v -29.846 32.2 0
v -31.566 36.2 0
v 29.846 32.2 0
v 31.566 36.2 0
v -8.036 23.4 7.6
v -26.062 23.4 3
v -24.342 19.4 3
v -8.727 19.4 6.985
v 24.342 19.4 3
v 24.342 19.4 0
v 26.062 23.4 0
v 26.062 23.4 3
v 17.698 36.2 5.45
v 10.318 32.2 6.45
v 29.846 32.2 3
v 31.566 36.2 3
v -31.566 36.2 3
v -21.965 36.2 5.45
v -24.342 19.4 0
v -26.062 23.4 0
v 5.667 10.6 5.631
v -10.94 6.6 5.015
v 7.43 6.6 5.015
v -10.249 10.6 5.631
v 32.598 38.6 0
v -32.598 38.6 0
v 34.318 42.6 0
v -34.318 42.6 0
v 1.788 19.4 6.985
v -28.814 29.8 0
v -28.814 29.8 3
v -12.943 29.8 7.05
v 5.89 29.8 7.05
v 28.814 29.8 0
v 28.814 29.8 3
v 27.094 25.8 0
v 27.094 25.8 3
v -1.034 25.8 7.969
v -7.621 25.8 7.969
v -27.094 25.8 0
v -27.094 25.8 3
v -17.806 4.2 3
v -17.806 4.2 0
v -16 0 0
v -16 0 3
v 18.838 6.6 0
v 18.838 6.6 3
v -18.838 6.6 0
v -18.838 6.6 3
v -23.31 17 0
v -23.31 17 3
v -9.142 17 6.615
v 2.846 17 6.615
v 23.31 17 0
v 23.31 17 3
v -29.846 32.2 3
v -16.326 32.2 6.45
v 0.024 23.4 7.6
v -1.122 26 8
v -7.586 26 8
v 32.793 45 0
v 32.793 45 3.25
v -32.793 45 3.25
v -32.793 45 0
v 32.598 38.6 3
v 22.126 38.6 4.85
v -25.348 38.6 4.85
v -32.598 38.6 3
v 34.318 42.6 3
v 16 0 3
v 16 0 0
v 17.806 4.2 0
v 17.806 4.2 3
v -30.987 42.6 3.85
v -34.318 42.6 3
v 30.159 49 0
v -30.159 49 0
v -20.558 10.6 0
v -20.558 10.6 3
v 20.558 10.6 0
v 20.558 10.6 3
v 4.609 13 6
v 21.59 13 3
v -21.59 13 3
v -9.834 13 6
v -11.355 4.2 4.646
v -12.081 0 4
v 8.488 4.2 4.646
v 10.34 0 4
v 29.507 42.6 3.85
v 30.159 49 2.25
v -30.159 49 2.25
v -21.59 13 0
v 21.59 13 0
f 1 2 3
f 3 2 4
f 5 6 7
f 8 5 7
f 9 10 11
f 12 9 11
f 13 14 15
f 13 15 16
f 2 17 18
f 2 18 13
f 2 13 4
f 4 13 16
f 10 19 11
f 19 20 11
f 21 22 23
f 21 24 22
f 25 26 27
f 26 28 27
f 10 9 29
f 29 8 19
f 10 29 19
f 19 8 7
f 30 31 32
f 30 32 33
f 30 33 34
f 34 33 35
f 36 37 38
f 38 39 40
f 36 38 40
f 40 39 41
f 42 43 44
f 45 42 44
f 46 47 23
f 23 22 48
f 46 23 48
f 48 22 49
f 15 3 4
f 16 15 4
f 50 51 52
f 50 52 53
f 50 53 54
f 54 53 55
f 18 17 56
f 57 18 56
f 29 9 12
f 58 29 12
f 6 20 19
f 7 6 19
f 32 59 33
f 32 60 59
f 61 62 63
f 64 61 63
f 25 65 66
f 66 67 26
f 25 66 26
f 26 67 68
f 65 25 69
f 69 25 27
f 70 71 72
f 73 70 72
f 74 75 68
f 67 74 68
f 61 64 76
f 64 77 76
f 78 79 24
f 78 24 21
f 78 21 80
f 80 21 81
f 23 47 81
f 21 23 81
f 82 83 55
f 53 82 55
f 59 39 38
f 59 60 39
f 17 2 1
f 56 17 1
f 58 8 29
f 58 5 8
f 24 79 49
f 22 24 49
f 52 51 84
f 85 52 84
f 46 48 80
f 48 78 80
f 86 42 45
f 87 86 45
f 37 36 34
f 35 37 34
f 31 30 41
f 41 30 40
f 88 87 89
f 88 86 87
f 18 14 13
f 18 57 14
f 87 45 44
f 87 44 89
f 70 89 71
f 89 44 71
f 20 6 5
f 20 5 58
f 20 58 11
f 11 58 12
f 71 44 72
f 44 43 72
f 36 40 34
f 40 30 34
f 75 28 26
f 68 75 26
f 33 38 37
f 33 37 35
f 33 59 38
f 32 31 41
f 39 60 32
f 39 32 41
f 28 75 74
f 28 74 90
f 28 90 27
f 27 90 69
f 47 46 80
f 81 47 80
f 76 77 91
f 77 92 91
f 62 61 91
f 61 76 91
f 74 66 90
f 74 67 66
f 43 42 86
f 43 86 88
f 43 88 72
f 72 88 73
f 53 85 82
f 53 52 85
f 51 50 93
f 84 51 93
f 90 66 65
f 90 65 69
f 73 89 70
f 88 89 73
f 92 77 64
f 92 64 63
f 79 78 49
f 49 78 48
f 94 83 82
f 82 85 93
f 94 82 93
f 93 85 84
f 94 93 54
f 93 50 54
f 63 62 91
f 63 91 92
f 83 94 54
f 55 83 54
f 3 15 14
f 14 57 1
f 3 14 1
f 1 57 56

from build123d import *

# Parameters (mm, degrees)
F1_DEPTH = 8
F2_SIZE2 = 18
F2_SIZE  = 5
F3_SIZE2 = 26
F3_SIZE  = 4
F4_SIZE2 = 26
F4_SIZE  = 5
F5_SIZE2 = 23.99999
F5_SIZE  = 5.99999
F6_SIZE  = 8
F8_W     = 49.696596037
F8_H     = 2.4
F9_DEPTH = 36.2


# Not quite as in the source:
# - a fillet or chamfer is up to 0.001 mm smaller than in the source, because OpenCascade refuses the exact size


with BuildPart() as f1:
    # F0 (on Top) → F1 (new body)
    with BuildSketch(Plane.XY):
        Polygon((0, 50), (0, 0), (16, 0), (37.5, 50), align=None)
        Polygon((-16, 0), (0, 0), (0, 50), (-37.5, 50), align=None)
    extrude(amount=F1_DEPTH)

    # F2
    f2_edges = [f1.edges().sort_by_distance(p)[0] for p in [
        (-26.75, 25, 8),
    ]]
    f2_side = f1.faces().sort_by_distance((-26.75, 25, 4))[0]
    chamfer(f2_edges, length=F2_SIZE, length2=F2_SIZE2, reference=f2_side)

    # F3
    f3_edges = [f1.edges().sort_by_distance(p)[0] for p in [
        (9.79678, 0, 8),
    ]]
    f3_side = f1.faces().sort_by_distance((2.240499, 0, 3.447889))[0]
    chamfer(f3_edges, length=F3_SIZE, length2=F3_SIZE2, reference=f3_side)

    # F4
    f4_edges = [f1.edges().sort_by_distance(p)[0] for p in [
        (32.34, 38, 8),
    ]]
    f4_side = f1.faces().sort_by_distance((27.799464, 27.440613, 3.601533))[0]
    chamfer(f4_edges, length=F4_SIZE, length2=F4_SIZE2, reference=f4_side)

    # F5 (size 6 and 24 in the source; OpenCascade refuses exactly that, so slightly less here)
    f5_edges = [f1.edges().sort_by_distance(p)[0] for p in [
        (-4.354124, 50, 8),
    ]]
    f5_side = f1.faces().sort_by_distance((-0.976192, 50, 3.418255))[0]
    chamfer(f5_edges, length=F5_SIZE, length2=F5_SIZE2, reference=f5_side)

    # F6
    f6_edges = [f1.edges().sort_by_distance(p)[0] for p in [
        (-37.5, 50, 1.000005),
        (37.5, 50, 1.000005),
    ]]
    chamfer(f6_edges, length=F6_SIZE)

    # F8 (on offset) → F9 (cut)
    with BuildSketch(Plane.XY.offset(25)):
        with Locations((-24.8482980185, 50.2)):
            Rectangle(F8_W, F8_H)
        with Locations((24.8482980185, 50.2)):
            Rectangle(F8_W, F8_H)
        with Locations((24.8482980185, 43.8)):
            Rectangle(F8_W, F8_H)
        with Locations((24.8482980185, 37.4)):
            Rectangle(F8_W, F8_H)
        with Locations((24.8482980185, 31)):
            Rectangle(F8_W, F8_H)
        with Locations((24.8482980185, 24.6)):
            Rectangle(F8_W, F8_H)
        with Locations((24.8482980185, 18.2)):
            Rectangle(F8_W, F8_H)
        with Locations((24.8482980185, 11.8)):
            Rectangle(F8_W, F8_H)
        with Locations((24.8482980185, 5.4)):
            Rectangle(F8_W, F8_H)
        with Locations((-24.8482980185, 5.4)):
            Rectangle(F8_W, F8_H)
        with Locations((-24.8482980185, 11.8)):
            Rectangle(F8_W, F8_H)
        with Locations((-24.8482980185, 18.2)):
            Rectangle(F8_W, F8_H)
        with Locations((-24.8482980185, 24.6)):
            Rectangle(F8_W, F8_H)
        with Locations((-24.8482980185, 31)):
            Rectangle(F8_W, F8_H)
        with Locations((-24.8482980185, 37.4)):
            Rectangle(F8_W, F8_H)
        with Locations((-24.8482980185, 43.8)):
            Rectangle(F8_W, F8_H)
    extrude(amount=-F9_DEPTH, mode=Mode.SUBTRACT)


solid = f1.part
